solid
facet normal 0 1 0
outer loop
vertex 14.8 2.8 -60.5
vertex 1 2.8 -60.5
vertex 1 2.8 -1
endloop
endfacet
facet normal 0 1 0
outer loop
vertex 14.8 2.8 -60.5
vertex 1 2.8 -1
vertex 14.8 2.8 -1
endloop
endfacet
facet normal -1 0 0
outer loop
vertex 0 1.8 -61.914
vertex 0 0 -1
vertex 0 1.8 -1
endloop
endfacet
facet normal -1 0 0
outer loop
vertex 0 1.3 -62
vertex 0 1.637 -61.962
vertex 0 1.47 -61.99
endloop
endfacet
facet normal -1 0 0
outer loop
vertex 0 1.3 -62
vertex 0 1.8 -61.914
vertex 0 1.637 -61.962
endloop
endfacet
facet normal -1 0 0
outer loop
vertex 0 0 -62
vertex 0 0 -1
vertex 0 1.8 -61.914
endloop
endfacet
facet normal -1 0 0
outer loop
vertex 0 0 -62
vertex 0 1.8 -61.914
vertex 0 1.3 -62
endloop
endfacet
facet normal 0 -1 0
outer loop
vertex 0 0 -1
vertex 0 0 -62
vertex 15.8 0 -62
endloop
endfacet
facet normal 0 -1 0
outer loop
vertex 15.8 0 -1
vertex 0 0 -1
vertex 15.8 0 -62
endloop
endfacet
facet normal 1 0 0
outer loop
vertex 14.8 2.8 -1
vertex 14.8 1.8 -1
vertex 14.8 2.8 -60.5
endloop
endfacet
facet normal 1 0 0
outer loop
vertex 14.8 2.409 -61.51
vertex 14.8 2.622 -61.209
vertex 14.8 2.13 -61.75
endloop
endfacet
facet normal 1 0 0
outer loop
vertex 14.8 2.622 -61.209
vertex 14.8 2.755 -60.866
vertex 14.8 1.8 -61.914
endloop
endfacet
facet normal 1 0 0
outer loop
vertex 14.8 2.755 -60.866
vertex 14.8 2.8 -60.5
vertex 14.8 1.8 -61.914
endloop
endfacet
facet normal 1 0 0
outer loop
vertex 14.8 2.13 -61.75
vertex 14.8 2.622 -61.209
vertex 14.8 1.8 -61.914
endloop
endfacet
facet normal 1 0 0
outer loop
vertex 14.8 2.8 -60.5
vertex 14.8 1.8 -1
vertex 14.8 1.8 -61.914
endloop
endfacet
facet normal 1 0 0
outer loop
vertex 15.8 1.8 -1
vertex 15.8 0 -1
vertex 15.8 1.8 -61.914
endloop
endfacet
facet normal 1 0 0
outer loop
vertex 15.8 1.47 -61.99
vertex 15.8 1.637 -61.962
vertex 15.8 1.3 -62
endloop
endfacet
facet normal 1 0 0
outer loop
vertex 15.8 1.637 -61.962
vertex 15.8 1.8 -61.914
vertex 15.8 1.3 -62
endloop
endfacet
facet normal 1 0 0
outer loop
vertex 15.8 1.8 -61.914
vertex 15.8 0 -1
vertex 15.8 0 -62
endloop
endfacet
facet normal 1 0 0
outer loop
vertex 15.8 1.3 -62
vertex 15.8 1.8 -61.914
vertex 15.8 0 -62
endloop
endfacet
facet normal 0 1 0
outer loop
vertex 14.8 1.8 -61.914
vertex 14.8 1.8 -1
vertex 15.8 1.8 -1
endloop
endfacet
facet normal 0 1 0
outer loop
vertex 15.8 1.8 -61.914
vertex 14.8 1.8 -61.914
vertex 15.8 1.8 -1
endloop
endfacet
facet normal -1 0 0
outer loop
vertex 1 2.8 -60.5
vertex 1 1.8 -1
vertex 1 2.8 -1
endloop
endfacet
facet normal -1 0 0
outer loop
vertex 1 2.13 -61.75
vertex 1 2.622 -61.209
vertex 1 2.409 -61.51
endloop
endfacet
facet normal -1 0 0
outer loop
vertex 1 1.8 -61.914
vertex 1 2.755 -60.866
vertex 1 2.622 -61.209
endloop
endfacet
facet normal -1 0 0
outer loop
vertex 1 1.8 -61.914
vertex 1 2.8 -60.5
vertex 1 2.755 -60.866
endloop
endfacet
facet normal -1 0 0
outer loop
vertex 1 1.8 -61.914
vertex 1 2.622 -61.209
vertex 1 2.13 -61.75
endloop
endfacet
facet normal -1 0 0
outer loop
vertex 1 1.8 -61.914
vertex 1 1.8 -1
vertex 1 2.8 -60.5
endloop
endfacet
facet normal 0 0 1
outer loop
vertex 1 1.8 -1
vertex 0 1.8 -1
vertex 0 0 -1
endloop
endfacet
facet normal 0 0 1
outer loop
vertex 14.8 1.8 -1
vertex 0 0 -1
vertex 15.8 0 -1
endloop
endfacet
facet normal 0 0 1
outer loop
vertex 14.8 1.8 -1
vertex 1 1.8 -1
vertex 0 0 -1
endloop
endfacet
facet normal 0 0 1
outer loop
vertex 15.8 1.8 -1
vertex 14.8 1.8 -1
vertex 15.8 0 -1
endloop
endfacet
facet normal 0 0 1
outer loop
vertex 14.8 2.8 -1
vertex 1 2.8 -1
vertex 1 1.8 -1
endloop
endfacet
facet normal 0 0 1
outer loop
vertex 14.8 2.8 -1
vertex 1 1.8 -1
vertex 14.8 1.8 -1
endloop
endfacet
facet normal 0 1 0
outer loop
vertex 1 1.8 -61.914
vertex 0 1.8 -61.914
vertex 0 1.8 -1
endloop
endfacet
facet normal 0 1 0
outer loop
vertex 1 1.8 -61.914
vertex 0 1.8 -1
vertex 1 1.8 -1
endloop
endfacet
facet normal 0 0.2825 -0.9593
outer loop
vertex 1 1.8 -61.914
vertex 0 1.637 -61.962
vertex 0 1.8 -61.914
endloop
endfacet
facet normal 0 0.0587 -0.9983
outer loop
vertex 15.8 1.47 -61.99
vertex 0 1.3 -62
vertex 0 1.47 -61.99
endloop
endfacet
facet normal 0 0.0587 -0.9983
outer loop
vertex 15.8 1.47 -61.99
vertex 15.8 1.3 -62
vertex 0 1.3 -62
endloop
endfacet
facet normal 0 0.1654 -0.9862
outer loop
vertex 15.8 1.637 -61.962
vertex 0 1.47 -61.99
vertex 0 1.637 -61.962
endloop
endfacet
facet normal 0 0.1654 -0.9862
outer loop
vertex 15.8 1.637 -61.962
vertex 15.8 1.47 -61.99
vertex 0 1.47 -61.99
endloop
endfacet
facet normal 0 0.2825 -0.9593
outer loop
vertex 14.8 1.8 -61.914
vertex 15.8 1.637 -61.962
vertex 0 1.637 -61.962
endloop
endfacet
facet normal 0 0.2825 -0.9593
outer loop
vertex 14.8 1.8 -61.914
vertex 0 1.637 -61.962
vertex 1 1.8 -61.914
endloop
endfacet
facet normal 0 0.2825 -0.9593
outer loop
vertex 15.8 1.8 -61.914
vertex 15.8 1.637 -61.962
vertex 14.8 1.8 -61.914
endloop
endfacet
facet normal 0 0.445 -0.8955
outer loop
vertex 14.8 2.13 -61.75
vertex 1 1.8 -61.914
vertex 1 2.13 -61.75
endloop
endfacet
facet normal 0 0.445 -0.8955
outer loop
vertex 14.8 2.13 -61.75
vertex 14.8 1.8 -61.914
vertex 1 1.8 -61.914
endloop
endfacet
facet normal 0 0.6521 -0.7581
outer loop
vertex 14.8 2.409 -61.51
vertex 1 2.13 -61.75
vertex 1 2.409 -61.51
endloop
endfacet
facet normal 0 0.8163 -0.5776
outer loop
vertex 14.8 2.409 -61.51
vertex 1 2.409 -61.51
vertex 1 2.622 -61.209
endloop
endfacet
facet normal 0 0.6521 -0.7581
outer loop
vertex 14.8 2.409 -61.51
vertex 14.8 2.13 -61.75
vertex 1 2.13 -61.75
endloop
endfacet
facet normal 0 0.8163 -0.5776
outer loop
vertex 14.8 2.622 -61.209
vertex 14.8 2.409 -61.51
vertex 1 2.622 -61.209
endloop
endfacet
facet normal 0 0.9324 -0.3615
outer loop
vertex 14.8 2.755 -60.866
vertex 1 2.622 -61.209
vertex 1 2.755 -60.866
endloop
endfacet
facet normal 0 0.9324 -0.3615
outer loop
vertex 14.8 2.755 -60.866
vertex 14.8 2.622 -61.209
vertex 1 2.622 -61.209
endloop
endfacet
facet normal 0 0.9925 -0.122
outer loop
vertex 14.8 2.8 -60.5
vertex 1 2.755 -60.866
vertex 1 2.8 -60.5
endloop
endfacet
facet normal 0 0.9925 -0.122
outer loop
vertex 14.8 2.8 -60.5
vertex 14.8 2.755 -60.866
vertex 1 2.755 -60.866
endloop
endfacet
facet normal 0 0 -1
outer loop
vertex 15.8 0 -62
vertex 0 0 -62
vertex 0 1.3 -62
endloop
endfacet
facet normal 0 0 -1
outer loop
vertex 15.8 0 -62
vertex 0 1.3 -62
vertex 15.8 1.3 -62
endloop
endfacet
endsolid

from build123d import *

# Parameters (mm, degrees)
ESQUISSE1_W             = 15.8
ESQUISSE1_H             = 62
BOSS_EXTRU_1_DEPTH      = 1.8
ESQUISSE2_W             = 13.8
ESQUISSE2_H             = 61
BOSS_EXTRU_2_DEPTH      = 1
CONG_1_R                = 1.5
ESQUISSE3_W             = 15.8
ESQUISSE3_H             = 1
ENL_V_MAT_EXTRU_1_DEPTH = 10


with BuildPart() as part:
    # Esquisse1 → Boss.-Extru.1 (new body)
    with BuildSketch(Plane(origin=(0, 0, 0), x_dir=(1, 0, 0), z_dir=(0, 1, 0))):
        with Locations((7.9, 31)):
            Rectangle(ESQUISSE1_W, ESQUISSE1_H)
    extrude(amount=BOSS_EXTRU_1_DEPTH)

    # Esquisse2 → Boss.-Extru.2 (add)
    with BuildSketch(Plane(origin=(0, 1.8, 0), x_dir=(1, 0, 0), z_dir=(0, 1, 0))):
        with Locations((7.9, 31.5)):
            Rectangle(ESQUISSE2_W, ESQUISSE2_H)
    extrude(amount=BOSS_EXTRU_2_DEPTH)

    # Congé1
    cong_1_edges = [part.edges().sort_by_distance(p)[0] for p in [
        (7.9, 2.8, -62),
    ]]
    fillet(cong_1_edges, radius=CONG_1_R)

    # Esquisse3 → Enlèv. mat.-Extru.1 (cut)
    with BuildSketch(Plane(origin=(0, 2.8, 0), x_dir=(1, 0, 0), z_dir=(0, 1, 0))):
        with Locations((7.9, 0.5)):
            Rectangle(ESQUISSE3_W, ESQUISSE3_H)
    extrude(amount=-ENL_V_MAT_EXTRU_1_DEPTH, mode=Mode.SUBTRACT)


solid = part.part
